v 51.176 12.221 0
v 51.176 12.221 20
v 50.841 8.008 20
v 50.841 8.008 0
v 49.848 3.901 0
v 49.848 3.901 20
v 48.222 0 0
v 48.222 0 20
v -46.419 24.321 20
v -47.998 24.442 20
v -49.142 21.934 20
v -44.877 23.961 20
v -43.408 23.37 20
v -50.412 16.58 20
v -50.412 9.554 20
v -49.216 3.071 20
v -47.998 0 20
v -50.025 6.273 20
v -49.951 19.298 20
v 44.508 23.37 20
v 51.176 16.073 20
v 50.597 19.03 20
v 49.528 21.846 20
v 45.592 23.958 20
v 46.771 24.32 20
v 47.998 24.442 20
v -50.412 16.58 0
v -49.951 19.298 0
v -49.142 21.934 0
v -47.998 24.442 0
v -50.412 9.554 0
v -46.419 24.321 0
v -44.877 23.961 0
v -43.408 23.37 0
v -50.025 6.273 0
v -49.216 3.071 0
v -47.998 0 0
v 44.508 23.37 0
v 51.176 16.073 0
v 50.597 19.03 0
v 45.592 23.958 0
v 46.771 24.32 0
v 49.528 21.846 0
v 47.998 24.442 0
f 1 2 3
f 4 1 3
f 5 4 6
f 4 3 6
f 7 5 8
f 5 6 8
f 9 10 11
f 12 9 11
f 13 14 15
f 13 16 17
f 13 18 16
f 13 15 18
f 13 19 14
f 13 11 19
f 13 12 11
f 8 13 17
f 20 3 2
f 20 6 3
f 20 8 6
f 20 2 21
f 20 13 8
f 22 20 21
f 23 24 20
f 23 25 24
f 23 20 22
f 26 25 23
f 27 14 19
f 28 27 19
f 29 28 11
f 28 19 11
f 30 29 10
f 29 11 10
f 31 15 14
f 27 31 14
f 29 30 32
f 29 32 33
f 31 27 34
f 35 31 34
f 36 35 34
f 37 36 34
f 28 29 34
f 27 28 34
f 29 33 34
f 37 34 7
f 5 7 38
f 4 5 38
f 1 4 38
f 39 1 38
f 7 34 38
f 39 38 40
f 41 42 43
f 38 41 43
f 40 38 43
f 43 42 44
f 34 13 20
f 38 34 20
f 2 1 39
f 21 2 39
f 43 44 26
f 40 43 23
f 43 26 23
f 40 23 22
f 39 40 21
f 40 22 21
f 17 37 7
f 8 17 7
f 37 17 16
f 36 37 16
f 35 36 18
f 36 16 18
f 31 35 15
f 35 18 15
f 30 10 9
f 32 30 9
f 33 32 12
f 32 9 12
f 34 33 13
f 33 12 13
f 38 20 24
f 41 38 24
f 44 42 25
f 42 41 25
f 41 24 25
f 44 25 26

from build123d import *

# Parameters (mm, degrees)
F0_W     = 101.5878766775
F0_H     = 24.442197755
F1_DEPTH = 20
F3_DEPTH = 25
F5_DEPTH = 25


with BuildPart() as f1:
    # F0 (on Top) → F1 (new body)
    with BuildSketch(Plane.XY):
        with Locations((0.3819093108, 12.2210988775)):
            Rectangle(F0_W, F0_H)
    extrude(amount=F1_DEPTH)

    # F2 (on face) → F3 (cut)
    with BuildSketch(Plane.XY.offset(20)):
        with BuildLine():
            ThreePointArc((-50.4120290279, 16.5795714258), (-49.5897410565, 20.6289075462), (-47.9984842241, 24.442197755))
            Line((-47.9984842241, 24.442197755), (-50.4120290279, 24.442197755))
            Line((-50.4120290279, 24.442197755), (-50.4120290279, 16.5795714258))
        make_face()
        with BuildLine():
            ThreePointArc((-47.9984842241, 0), (-49.6724374157, 4.6588518495), (-50.4120290279, 9.5537496105))
            Line((-50.4120290279, 9.5537496105), (-50.4120290279, 0))
            Line((-50.4120290279, 0), (-47.9984842241, 0))
        make_face()
        with BuildLine():
            Line((51.1758476496, 24.442197755), (47.9984171689, 24.442197755))
            ThreePointArc((47.9984171689, 24.442197755), (50.12222675, 20.4607446272), (51.1758476496, 16.0729867548))
            Line((51.1758476496, 16.0729867548), (51.1758476496, 24.442197755))
        make_face()
        with BuildLine():
            Line((51.1758476496, 0), (51.1758476496, 12.2210988775))
            ThreePointArc((51.1758476496, 12.2210988775), (50.425198292, 5.9349952856), (48.2219271362, 0))
            Line((48.2219271362, 0), (51.1758476496, 0))
        make_face()
    extrude(amount=-F3_DEPTH, mode=Mode.SUBTRACT)

    # F4 (on face) → F5 (cut)
    with BuildSketch(Plane.XY.offset(20)):
        with BuildLine():
            ThreePointArc((-47.9984842241, 24.442197755), (-45.641486399, 24.1705843884), (-43.4080474079, 23.3699828386))
            Line((-43.4080474079, 23.3699828386), (44.5075258613, 23.3699828386))
            ThreePointArc((44.5075258613, 23.3699828386), (46.1724950081, 24.1681037554), (47.9984171689, 24.442197755))
            Line((47.9984171689, 24.442197755), (-47.9984842241, 24.442197755))
        make_face()
    extrude(amount=-F5_DEPTH, mode=Mode.SUBTRACT)


solid = f1.part
